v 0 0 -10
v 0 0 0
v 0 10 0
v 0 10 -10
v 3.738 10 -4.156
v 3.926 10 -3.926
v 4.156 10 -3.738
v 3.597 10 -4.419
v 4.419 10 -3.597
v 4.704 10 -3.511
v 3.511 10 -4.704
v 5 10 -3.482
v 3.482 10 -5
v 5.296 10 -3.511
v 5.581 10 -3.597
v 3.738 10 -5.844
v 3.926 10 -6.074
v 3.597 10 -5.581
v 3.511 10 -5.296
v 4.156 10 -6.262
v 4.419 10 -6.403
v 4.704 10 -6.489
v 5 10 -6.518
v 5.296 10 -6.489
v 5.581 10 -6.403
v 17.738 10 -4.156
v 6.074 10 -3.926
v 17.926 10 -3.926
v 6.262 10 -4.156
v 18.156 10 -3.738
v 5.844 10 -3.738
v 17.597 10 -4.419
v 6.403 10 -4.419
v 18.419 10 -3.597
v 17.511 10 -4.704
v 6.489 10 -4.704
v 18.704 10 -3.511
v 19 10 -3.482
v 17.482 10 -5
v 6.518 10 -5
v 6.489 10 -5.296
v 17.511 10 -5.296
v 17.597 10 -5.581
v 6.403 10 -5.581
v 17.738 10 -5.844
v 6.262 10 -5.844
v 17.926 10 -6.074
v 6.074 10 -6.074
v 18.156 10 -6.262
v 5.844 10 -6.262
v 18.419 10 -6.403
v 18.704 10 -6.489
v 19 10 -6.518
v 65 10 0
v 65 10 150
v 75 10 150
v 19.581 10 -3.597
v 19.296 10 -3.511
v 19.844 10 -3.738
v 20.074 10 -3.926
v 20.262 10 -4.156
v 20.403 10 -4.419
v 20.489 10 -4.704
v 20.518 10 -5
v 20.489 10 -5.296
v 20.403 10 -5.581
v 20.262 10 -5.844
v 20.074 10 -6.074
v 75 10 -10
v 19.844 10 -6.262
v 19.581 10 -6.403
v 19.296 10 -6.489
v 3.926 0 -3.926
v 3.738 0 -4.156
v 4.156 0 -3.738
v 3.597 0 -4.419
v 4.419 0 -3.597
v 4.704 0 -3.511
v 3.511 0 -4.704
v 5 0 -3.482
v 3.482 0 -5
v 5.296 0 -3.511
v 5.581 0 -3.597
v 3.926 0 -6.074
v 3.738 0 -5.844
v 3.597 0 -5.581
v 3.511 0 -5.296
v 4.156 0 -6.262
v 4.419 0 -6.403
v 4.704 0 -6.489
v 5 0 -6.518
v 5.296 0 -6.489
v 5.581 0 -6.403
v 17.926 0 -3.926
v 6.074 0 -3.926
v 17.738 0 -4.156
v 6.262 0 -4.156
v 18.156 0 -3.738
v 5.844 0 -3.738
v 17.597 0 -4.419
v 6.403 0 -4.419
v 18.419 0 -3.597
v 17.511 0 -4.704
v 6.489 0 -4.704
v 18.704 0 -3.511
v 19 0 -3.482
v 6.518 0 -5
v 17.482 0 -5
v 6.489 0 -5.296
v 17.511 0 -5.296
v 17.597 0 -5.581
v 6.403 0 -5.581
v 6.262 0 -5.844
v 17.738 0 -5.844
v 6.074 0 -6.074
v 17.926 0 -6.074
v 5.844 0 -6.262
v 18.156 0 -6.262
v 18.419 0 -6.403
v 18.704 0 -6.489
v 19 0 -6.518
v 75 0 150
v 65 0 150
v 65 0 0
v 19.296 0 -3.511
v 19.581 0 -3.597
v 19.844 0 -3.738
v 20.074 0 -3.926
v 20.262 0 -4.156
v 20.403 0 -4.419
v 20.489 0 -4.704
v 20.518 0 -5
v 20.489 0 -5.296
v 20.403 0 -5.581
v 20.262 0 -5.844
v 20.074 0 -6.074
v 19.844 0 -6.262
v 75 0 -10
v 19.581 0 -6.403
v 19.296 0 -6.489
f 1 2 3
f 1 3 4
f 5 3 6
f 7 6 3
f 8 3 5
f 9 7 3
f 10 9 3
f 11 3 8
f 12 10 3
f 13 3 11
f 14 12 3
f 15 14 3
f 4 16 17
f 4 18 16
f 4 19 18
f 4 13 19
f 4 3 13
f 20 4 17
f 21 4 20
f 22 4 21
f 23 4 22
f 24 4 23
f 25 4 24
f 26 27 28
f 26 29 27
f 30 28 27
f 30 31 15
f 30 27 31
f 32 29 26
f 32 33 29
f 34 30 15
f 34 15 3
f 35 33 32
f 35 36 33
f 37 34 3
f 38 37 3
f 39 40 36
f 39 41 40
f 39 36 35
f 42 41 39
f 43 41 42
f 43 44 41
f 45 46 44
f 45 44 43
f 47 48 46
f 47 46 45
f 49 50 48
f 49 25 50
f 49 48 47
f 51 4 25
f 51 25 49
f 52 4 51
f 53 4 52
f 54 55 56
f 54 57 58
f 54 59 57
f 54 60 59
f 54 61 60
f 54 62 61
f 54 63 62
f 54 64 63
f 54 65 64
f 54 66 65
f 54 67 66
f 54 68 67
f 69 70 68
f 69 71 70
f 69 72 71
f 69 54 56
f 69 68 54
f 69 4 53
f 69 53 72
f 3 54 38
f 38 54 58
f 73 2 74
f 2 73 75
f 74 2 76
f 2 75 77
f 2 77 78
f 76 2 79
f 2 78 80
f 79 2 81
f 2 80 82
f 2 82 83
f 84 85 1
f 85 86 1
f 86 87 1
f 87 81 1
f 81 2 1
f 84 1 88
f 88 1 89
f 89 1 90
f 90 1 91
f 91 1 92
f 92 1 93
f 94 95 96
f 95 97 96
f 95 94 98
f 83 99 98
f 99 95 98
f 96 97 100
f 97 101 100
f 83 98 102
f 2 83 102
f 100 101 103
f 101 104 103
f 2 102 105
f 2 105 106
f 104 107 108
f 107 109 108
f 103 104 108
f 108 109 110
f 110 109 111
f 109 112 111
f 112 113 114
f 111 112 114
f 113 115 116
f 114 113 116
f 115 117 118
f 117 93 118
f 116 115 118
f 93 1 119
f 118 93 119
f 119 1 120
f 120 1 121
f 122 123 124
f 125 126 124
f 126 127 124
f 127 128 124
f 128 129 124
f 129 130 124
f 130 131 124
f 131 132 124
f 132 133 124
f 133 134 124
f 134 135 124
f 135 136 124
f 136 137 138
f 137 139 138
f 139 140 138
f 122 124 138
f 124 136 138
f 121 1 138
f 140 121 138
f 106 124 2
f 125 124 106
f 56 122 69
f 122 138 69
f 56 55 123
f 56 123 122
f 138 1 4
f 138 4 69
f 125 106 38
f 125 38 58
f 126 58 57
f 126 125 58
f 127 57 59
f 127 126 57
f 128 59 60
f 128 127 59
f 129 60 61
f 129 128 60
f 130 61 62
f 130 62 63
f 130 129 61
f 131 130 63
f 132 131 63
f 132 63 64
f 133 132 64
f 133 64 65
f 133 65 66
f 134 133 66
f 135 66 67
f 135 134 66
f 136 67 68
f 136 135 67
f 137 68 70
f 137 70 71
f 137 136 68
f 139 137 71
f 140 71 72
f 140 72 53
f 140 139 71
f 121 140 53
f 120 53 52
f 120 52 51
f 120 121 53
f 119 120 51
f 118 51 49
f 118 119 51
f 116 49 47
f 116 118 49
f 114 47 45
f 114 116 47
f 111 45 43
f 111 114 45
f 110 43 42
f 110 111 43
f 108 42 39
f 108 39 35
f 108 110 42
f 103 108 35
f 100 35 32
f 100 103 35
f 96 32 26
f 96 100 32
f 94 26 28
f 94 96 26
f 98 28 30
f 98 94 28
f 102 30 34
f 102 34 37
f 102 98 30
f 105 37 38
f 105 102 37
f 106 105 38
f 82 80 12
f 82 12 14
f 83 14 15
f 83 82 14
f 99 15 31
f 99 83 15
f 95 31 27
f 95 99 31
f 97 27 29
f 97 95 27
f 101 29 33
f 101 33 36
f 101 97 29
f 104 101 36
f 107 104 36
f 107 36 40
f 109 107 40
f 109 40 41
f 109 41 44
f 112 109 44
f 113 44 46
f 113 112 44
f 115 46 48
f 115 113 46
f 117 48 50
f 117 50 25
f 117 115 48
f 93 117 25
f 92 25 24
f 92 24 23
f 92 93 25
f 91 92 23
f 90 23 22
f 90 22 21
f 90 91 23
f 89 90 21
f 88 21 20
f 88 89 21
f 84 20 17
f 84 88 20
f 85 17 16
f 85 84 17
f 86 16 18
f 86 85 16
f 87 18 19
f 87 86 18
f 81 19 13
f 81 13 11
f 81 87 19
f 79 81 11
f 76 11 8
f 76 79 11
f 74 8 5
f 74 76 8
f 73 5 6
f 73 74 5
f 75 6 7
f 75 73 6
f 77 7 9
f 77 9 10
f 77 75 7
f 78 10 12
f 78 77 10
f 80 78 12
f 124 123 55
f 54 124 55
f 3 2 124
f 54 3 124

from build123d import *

# Parameters (mm, degrees)
SKETCH1_W           = 75
SKETCH1_H           = 10
SKETCH1_R           = 1.518320508
BOSS_EXTRUDE1_DEPTH = 10
SKETCH5_W           = 10
SKETCH5_H           = 10
BOSS_EXTRUDE3_DEPTH = 150


with BuildPart() as part:
    # Sketch1 → Boss-Extrude1 (new body)
    with BuildSketch(Plane(origin=(0, 0, 0), x_dir=(1, 0, 0), z_dir=(0, 1, 0))):
        with Locations((37.5, 5)):
            Rectangle(SKETCH1_W, SKETCH1_H)
        with Locations(Location((5, 5, 0), (0, 0, 270))):
            Circle(SKETCH1_R, mode=Mode.SUBTRACT)
        with Locations(Location((19, 5, 0), (0, 0, 270))):
            Circle(SKETCH1_R, mode=Mode.SUBTRACT)
    extrude(amount=BOSS_EXTRUDE1_DEPTH)

    # Sketch5 → Boss-Extrude3 (add)
    with BuildSketch(Plane.XY):
        with Locations((70, 5)):
            Rectangle(SKETCH5_W, SKETCH5_H)
    extrude(amount=BOSS_EXTRUDE3_DEPTH)


solid = part.part
